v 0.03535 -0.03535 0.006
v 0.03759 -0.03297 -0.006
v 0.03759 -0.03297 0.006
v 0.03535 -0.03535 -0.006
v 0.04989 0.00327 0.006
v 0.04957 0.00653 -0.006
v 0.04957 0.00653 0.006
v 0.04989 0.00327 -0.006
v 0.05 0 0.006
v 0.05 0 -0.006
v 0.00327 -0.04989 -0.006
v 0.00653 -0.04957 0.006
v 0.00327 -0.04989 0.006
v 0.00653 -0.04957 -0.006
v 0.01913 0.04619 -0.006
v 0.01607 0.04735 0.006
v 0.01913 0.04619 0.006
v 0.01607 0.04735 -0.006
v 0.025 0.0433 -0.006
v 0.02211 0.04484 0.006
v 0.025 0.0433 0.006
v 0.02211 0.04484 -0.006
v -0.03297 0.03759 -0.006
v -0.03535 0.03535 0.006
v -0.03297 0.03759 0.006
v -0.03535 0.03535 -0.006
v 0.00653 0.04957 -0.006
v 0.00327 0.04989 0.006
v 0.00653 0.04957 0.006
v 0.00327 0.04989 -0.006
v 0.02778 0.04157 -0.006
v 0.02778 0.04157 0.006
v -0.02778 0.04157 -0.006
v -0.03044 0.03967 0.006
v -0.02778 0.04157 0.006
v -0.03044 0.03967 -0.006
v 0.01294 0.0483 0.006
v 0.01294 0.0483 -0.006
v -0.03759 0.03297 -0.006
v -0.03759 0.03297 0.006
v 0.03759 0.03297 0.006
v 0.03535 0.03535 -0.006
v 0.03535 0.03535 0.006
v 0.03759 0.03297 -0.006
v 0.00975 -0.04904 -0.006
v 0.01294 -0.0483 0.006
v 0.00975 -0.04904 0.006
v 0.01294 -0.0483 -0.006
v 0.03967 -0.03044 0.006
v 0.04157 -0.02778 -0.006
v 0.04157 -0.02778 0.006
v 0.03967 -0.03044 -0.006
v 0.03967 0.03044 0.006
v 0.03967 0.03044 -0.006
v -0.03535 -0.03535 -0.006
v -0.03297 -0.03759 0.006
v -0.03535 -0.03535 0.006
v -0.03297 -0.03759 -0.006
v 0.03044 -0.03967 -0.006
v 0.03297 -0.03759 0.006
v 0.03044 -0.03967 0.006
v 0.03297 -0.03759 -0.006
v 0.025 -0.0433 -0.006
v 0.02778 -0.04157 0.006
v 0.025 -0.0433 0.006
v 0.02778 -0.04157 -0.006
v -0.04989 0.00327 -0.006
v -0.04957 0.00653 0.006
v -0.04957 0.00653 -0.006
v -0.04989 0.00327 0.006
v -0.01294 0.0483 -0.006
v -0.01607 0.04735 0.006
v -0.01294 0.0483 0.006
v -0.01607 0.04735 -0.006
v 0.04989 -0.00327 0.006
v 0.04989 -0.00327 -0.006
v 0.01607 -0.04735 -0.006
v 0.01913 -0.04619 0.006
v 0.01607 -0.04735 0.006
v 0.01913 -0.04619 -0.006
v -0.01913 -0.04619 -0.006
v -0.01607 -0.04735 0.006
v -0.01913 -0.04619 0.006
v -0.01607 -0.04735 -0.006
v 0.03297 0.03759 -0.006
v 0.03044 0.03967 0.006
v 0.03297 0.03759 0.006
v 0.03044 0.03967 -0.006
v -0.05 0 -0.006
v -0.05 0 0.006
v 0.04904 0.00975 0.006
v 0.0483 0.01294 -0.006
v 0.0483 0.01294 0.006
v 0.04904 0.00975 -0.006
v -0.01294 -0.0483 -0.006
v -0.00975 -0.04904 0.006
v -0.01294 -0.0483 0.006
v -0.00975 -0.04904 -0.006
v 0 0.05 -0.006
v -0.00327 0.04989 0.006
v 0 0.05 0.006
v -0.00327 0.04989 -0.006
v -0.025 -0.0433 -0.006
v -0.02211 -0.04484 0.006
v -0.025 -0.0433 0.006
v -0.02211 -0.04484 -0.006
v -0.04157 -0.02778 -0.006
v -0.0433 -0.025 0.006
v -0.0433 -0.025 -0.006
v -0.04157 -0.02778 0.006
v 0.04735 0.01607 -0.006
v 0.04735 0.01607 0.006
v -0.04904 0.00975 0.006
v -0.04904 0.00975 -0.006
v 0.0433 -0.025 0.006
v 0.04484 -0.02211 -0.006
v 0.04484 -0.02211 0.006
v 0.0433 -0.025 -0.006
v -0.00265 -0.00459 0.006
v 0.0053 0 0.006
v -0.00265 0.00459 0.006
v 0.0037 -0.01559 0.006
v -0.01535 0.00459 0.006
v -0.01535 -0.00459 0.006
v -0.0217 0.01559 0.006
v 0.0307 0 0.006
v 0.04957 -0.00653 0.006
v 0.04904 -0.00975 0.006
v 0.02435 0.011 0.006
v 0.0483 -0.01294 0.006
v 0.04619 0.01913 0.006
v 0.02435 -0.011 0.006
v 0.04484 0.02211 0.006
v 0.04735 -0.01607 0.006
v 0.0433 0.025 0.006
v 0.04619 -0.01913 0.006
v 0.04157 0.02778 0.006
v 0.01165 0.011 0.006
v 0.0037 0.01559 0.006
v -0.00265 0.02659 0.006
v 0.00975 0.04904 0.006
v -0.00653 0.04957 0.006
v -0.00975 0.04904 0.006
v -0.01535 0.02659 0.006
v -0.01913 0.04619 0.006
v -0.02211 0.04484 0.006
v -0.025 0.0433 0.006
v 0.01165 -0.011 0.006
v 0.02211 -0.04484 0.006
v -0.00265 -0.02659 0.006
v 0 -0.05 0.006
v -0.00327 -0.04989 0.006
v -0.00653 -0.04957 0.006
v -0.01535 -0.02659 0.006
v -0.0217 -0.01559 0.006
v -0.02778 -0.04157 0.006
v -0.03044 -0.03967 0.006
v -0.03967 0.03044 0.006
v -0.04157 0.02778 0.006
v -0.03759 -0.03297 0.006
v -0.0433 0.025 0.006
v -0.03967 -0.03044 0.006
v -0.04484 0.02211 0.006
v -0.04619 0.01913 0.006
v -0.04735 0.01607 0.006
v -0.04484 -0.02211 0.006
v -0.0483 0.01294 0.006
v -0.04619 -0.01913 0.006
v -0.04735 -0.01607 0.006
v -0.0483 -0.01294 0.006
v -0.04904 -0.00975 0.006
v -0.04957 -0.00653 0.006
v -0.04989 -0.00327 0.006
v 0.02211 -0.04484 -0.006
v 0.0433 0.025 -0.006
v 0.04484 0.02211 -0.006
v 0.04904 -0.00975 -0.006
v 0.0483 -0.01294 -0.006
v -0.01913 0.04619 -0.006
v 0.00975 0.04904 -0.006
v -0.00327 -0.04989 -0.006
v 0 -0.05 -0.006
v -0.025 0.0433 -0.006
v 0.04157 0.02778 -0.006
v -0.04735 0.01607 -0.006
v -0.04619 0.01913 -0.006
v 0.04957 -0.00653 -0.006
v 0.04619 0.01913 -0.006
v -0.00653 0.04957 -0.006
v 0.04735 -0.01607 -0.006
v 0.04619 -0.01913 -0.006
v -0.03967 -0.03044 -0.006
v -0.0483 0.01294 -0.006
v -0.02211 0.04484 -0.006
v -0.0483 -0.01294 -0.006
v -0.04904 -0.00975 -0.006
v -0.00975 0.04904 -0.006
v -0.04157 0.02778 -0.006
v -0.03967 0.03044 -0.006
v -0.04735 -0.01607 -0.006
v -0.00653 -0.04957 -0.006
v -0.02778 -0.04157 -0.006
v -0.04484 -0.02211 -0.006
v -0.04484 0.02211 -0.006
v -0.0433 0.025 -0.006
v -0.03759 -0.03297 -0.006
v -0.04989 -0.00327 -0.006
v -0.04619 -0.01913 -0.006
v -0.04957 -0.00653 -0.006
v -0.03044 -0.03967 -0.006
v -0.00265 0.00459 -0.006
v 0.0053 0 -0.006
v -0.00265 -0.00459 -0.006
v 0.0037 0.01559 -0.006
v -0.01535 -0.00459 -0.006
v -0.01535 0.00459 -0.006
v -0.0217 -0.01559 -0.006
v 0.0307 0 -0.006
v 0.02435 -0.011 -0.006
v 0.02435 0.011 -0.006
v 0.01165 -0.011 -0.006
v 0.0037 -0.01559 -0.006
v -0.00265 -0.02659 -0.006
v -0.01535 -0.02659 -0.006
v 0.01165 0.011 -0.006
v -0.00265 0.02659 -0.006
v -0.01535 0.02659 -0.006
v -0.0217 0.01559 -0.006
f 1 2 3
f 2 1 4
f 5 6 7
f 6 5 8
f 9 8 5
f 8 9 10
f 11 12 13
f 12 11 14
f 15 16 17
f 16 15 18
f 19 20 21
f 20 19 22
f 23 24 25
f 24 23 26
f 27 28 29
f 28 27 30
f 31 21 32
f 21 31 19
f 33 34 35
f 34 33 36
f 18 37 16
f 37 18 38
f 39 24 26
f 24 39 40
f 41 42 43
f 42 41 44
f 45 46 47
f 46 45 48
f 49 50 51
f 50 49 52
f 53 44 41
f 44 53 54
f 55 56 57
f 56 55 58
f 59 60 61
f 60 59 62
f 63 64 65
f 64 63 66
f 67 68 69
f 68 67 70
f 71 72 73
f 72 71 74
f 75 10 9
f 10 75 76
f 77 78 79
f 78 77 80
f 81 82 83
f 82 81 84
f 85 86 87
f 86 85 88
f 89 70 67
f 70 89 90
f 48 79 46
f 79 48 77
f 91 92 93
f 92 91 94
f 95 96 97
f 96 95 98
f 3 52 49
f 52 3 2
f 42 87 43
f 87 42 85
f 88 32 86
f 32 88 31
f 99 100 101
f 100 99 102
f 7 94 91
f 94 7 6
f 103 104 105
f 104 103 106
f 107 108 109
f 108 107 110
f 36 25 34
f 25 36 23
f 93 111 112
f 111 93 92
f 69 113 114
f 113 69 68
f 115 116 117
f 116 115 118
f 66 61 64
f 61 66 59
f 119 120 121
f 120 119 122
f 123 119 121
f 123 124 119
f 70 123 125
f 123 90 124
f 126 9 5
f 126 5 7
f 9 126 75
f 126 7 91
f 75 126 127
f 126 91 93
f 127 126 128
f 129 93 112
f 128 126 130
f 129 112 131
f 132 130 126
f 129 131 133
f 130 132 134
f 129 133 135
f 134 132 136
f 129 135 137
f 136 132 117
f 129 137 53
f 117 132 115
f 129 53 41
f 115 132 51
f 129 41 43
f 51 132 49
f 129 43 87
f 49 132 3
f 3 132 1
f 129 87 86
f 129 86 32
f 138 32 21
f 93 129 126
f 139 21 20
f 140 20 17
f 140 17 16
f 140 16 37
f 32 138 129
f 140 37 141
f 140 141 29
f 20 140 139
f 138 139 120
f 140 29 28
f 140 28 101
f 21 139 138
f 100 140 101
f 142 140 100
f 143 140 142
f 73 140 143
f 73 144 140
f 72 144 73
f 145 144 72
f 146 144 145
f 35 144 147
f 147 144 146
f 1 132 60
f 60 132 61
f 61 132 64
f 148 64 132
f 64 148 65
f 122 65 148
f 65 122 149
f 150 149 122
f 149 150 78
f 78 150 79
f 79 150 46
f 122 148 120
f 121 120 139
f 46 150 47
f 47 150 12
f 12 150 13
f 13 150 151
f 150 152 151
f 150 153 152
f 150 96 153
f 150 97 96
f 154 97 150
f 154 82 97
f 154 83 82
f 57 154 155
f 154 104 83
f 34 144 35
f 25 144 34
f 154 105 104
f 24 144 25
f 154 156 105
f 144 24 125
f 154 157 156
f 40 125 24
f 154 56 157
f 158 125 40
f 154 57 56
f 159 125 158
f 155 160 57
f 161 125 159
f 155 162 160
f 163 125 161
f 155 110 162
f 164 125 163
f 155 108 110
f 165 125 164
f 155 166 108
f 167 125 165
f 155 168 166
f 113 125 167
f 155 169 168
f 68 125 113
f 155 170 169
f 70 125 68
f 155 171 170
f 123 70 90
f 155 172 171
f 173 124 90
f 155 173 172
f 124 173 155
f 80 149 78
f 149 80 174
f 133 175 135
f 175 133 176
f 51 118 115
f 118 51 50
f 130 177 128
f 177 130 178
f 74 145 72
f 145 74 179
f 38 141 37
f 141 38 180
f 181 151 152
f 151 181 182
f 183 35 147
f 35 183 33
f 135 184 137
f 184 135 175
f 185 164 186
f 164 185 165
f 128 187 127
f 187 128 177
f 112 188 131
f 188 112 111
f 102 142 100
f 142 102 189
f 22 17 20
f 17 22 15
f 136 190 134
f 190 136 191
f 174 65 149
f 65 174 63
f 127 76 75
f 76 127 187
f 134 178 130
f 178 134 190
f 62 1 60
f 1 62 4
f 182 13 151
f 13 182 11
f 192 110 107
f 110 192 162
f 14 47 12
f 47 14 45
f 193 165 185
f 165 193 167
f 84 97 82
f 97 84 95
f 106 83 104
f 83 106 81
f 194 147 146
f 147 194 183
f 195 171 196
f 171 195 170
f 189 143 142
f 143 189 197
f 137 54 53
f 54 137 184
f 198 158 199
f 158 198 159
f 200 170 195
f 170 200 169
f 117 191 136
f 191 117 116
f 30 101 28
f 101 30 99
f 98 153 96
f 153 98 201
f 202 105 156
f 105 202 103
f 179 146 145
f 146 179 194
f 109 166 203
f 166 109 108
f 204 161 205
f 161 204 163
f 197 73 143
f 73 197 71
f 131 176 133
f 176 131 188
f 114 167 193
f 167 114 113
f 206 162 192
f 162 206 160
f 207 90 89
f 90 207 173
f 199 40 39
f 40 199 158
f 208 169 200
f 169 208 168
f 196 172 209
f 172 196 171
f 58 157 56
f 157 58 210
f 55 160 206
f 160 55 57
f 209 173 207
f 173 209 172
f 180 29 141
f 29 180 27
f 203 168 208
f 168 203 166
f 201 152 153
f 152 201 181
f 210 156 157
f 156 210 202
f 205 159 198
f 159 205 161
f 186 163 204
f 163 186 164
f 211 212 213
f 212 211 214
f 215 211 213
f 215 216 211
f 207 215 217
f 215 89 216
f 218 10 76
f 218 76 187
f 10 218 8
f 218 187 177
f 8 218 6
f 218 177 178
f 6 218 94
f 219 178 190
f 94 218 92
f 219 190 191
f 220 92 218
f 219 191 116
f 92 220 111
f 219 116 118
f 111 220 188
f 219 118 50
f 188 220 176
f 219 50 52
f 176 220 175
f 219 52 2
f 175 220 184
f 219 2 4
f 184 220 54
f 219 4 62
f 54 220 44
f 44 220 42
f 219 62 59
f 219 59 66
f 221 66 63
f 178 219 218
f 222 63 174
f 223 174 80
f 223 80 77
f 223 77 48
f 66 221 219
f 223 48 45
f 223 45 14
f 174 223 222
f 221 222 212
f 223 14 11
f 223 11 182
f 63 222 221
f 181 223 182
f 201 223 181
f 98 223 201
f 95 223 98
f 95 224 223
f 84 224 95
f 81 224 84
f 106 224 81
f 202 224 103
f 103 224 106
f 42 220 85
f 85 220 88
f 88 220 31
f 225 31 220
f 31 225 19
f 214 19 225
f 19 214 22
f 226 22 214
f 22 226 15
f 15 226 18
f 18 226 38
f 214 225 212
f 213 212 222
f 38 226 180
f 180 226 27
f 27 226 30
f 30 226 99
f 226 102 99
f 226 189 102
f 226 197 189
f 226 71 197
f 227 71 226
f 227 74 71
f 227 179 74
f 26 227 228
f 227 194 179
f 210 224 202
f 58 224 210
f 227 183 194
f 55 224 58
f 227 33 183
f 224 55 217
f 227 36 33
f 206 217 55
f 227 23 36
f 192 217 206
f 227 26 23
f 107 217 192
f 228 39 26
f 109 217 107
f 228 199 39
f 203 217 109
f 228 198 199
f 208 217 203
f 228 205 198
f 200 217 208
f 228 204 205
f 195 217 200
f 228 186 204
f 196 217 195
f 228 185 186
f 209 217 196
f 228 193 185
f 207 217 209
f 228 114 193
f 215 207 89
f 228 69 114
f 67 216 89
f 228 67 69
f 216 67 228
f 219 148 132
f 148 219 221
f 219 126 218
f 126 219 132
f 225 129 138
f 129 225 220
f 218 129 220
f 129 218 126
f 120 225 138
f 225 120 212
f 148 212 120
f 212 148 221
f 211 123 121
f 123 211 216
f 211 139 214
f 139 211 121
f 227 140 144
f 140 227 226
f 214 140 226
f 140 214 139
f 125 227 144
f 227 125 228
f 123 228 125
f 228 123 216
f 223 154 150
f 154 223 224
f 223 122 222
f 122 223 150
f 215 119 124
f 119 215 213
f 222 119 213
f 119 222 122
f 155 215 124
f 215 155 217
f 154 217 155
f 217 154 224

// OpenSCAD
$fn=96;

eps = 0.02;

// Bounding box target: 0.1 x 0.1 x 0.0 mm (flat/plate-like)
D_outer = 0.1;
R_outer = D_outer/2;

t_total = 0.02;          // very thin plate
t_flange = 0.012;        // base thickness
t_boss = t_total - t_flange;

D_boss = 0.06;
R_boss = D_boss/2;

hex_af = 0.022;          // across flats
hex_r = hex_af / sqrt(3);

hex_center_r = 0.018;    // radial placement of hex centers
web_w = 0.010;           // web rib width
web_depth = 0.004;       // recess depth on each face

module disk_base() {
    union() {
        cylinder(h=t_flange, r=R_outer, center=true);
        if (t_boss > 0)
            translate([0,0,(t_flange/2 - t_total/2) + t_boss/2])
                cylinder(h=t_boss, r=R_boss, center=true);
    }
}

module hex_prism(h) {
    cylinder(h=h, r=hex_r, $fn=6, center=true);
}

module hex_cutouts() {
    for (a = [0,120,240]) {
        translate([hex_center_r*cos(a), hex_center_r*sin(a), 0])
            hex_prism(t_total + 2*eps);
    }
}

module web_rib_between(p1, p2, w, h) {
    dx = p2[0]-p1[0];
    dy = p2[1]-p1[1];
    len = sqrt(dx*dx + dy*dy);
    ang = atan2(dy, dx);
    translate([(p1[0]+p2[0])/2, (p1[1]+p2[1])/2, 0])
        rotate([0,0,ang])
            cube([len, w, h], center=true);
}

module face_web_recess(zsign=1) {
    zc = zsign*(t_total/2 - web_depth/2 + eps/2);
    p0 = [hex_center_r*cos(0),   hex_center_r*sin(0)];
    p1 = [hex_center_r*cos(120), hex_center_r*sin(120)];
    p2 = [hex_center_r*cos(240), hex_center_r*sin(240)];
    translate([0,0,zc]) {
        union() {
            web_rib_between(p0, p1, web_w, web_depth + eps);
            web_rib_between(p1, p2, web_w, web_depth + eps);
            web_rib_between(p2, p0, web_w, web_depth + eps);
            cylinder(h=web_depth + eps, r=0.010, center=true);
        }
    }
}

difference() {
    disk_base();
    hex_cutouts();
    face_web_recess(1);
    face_web_recess(-1);
}
